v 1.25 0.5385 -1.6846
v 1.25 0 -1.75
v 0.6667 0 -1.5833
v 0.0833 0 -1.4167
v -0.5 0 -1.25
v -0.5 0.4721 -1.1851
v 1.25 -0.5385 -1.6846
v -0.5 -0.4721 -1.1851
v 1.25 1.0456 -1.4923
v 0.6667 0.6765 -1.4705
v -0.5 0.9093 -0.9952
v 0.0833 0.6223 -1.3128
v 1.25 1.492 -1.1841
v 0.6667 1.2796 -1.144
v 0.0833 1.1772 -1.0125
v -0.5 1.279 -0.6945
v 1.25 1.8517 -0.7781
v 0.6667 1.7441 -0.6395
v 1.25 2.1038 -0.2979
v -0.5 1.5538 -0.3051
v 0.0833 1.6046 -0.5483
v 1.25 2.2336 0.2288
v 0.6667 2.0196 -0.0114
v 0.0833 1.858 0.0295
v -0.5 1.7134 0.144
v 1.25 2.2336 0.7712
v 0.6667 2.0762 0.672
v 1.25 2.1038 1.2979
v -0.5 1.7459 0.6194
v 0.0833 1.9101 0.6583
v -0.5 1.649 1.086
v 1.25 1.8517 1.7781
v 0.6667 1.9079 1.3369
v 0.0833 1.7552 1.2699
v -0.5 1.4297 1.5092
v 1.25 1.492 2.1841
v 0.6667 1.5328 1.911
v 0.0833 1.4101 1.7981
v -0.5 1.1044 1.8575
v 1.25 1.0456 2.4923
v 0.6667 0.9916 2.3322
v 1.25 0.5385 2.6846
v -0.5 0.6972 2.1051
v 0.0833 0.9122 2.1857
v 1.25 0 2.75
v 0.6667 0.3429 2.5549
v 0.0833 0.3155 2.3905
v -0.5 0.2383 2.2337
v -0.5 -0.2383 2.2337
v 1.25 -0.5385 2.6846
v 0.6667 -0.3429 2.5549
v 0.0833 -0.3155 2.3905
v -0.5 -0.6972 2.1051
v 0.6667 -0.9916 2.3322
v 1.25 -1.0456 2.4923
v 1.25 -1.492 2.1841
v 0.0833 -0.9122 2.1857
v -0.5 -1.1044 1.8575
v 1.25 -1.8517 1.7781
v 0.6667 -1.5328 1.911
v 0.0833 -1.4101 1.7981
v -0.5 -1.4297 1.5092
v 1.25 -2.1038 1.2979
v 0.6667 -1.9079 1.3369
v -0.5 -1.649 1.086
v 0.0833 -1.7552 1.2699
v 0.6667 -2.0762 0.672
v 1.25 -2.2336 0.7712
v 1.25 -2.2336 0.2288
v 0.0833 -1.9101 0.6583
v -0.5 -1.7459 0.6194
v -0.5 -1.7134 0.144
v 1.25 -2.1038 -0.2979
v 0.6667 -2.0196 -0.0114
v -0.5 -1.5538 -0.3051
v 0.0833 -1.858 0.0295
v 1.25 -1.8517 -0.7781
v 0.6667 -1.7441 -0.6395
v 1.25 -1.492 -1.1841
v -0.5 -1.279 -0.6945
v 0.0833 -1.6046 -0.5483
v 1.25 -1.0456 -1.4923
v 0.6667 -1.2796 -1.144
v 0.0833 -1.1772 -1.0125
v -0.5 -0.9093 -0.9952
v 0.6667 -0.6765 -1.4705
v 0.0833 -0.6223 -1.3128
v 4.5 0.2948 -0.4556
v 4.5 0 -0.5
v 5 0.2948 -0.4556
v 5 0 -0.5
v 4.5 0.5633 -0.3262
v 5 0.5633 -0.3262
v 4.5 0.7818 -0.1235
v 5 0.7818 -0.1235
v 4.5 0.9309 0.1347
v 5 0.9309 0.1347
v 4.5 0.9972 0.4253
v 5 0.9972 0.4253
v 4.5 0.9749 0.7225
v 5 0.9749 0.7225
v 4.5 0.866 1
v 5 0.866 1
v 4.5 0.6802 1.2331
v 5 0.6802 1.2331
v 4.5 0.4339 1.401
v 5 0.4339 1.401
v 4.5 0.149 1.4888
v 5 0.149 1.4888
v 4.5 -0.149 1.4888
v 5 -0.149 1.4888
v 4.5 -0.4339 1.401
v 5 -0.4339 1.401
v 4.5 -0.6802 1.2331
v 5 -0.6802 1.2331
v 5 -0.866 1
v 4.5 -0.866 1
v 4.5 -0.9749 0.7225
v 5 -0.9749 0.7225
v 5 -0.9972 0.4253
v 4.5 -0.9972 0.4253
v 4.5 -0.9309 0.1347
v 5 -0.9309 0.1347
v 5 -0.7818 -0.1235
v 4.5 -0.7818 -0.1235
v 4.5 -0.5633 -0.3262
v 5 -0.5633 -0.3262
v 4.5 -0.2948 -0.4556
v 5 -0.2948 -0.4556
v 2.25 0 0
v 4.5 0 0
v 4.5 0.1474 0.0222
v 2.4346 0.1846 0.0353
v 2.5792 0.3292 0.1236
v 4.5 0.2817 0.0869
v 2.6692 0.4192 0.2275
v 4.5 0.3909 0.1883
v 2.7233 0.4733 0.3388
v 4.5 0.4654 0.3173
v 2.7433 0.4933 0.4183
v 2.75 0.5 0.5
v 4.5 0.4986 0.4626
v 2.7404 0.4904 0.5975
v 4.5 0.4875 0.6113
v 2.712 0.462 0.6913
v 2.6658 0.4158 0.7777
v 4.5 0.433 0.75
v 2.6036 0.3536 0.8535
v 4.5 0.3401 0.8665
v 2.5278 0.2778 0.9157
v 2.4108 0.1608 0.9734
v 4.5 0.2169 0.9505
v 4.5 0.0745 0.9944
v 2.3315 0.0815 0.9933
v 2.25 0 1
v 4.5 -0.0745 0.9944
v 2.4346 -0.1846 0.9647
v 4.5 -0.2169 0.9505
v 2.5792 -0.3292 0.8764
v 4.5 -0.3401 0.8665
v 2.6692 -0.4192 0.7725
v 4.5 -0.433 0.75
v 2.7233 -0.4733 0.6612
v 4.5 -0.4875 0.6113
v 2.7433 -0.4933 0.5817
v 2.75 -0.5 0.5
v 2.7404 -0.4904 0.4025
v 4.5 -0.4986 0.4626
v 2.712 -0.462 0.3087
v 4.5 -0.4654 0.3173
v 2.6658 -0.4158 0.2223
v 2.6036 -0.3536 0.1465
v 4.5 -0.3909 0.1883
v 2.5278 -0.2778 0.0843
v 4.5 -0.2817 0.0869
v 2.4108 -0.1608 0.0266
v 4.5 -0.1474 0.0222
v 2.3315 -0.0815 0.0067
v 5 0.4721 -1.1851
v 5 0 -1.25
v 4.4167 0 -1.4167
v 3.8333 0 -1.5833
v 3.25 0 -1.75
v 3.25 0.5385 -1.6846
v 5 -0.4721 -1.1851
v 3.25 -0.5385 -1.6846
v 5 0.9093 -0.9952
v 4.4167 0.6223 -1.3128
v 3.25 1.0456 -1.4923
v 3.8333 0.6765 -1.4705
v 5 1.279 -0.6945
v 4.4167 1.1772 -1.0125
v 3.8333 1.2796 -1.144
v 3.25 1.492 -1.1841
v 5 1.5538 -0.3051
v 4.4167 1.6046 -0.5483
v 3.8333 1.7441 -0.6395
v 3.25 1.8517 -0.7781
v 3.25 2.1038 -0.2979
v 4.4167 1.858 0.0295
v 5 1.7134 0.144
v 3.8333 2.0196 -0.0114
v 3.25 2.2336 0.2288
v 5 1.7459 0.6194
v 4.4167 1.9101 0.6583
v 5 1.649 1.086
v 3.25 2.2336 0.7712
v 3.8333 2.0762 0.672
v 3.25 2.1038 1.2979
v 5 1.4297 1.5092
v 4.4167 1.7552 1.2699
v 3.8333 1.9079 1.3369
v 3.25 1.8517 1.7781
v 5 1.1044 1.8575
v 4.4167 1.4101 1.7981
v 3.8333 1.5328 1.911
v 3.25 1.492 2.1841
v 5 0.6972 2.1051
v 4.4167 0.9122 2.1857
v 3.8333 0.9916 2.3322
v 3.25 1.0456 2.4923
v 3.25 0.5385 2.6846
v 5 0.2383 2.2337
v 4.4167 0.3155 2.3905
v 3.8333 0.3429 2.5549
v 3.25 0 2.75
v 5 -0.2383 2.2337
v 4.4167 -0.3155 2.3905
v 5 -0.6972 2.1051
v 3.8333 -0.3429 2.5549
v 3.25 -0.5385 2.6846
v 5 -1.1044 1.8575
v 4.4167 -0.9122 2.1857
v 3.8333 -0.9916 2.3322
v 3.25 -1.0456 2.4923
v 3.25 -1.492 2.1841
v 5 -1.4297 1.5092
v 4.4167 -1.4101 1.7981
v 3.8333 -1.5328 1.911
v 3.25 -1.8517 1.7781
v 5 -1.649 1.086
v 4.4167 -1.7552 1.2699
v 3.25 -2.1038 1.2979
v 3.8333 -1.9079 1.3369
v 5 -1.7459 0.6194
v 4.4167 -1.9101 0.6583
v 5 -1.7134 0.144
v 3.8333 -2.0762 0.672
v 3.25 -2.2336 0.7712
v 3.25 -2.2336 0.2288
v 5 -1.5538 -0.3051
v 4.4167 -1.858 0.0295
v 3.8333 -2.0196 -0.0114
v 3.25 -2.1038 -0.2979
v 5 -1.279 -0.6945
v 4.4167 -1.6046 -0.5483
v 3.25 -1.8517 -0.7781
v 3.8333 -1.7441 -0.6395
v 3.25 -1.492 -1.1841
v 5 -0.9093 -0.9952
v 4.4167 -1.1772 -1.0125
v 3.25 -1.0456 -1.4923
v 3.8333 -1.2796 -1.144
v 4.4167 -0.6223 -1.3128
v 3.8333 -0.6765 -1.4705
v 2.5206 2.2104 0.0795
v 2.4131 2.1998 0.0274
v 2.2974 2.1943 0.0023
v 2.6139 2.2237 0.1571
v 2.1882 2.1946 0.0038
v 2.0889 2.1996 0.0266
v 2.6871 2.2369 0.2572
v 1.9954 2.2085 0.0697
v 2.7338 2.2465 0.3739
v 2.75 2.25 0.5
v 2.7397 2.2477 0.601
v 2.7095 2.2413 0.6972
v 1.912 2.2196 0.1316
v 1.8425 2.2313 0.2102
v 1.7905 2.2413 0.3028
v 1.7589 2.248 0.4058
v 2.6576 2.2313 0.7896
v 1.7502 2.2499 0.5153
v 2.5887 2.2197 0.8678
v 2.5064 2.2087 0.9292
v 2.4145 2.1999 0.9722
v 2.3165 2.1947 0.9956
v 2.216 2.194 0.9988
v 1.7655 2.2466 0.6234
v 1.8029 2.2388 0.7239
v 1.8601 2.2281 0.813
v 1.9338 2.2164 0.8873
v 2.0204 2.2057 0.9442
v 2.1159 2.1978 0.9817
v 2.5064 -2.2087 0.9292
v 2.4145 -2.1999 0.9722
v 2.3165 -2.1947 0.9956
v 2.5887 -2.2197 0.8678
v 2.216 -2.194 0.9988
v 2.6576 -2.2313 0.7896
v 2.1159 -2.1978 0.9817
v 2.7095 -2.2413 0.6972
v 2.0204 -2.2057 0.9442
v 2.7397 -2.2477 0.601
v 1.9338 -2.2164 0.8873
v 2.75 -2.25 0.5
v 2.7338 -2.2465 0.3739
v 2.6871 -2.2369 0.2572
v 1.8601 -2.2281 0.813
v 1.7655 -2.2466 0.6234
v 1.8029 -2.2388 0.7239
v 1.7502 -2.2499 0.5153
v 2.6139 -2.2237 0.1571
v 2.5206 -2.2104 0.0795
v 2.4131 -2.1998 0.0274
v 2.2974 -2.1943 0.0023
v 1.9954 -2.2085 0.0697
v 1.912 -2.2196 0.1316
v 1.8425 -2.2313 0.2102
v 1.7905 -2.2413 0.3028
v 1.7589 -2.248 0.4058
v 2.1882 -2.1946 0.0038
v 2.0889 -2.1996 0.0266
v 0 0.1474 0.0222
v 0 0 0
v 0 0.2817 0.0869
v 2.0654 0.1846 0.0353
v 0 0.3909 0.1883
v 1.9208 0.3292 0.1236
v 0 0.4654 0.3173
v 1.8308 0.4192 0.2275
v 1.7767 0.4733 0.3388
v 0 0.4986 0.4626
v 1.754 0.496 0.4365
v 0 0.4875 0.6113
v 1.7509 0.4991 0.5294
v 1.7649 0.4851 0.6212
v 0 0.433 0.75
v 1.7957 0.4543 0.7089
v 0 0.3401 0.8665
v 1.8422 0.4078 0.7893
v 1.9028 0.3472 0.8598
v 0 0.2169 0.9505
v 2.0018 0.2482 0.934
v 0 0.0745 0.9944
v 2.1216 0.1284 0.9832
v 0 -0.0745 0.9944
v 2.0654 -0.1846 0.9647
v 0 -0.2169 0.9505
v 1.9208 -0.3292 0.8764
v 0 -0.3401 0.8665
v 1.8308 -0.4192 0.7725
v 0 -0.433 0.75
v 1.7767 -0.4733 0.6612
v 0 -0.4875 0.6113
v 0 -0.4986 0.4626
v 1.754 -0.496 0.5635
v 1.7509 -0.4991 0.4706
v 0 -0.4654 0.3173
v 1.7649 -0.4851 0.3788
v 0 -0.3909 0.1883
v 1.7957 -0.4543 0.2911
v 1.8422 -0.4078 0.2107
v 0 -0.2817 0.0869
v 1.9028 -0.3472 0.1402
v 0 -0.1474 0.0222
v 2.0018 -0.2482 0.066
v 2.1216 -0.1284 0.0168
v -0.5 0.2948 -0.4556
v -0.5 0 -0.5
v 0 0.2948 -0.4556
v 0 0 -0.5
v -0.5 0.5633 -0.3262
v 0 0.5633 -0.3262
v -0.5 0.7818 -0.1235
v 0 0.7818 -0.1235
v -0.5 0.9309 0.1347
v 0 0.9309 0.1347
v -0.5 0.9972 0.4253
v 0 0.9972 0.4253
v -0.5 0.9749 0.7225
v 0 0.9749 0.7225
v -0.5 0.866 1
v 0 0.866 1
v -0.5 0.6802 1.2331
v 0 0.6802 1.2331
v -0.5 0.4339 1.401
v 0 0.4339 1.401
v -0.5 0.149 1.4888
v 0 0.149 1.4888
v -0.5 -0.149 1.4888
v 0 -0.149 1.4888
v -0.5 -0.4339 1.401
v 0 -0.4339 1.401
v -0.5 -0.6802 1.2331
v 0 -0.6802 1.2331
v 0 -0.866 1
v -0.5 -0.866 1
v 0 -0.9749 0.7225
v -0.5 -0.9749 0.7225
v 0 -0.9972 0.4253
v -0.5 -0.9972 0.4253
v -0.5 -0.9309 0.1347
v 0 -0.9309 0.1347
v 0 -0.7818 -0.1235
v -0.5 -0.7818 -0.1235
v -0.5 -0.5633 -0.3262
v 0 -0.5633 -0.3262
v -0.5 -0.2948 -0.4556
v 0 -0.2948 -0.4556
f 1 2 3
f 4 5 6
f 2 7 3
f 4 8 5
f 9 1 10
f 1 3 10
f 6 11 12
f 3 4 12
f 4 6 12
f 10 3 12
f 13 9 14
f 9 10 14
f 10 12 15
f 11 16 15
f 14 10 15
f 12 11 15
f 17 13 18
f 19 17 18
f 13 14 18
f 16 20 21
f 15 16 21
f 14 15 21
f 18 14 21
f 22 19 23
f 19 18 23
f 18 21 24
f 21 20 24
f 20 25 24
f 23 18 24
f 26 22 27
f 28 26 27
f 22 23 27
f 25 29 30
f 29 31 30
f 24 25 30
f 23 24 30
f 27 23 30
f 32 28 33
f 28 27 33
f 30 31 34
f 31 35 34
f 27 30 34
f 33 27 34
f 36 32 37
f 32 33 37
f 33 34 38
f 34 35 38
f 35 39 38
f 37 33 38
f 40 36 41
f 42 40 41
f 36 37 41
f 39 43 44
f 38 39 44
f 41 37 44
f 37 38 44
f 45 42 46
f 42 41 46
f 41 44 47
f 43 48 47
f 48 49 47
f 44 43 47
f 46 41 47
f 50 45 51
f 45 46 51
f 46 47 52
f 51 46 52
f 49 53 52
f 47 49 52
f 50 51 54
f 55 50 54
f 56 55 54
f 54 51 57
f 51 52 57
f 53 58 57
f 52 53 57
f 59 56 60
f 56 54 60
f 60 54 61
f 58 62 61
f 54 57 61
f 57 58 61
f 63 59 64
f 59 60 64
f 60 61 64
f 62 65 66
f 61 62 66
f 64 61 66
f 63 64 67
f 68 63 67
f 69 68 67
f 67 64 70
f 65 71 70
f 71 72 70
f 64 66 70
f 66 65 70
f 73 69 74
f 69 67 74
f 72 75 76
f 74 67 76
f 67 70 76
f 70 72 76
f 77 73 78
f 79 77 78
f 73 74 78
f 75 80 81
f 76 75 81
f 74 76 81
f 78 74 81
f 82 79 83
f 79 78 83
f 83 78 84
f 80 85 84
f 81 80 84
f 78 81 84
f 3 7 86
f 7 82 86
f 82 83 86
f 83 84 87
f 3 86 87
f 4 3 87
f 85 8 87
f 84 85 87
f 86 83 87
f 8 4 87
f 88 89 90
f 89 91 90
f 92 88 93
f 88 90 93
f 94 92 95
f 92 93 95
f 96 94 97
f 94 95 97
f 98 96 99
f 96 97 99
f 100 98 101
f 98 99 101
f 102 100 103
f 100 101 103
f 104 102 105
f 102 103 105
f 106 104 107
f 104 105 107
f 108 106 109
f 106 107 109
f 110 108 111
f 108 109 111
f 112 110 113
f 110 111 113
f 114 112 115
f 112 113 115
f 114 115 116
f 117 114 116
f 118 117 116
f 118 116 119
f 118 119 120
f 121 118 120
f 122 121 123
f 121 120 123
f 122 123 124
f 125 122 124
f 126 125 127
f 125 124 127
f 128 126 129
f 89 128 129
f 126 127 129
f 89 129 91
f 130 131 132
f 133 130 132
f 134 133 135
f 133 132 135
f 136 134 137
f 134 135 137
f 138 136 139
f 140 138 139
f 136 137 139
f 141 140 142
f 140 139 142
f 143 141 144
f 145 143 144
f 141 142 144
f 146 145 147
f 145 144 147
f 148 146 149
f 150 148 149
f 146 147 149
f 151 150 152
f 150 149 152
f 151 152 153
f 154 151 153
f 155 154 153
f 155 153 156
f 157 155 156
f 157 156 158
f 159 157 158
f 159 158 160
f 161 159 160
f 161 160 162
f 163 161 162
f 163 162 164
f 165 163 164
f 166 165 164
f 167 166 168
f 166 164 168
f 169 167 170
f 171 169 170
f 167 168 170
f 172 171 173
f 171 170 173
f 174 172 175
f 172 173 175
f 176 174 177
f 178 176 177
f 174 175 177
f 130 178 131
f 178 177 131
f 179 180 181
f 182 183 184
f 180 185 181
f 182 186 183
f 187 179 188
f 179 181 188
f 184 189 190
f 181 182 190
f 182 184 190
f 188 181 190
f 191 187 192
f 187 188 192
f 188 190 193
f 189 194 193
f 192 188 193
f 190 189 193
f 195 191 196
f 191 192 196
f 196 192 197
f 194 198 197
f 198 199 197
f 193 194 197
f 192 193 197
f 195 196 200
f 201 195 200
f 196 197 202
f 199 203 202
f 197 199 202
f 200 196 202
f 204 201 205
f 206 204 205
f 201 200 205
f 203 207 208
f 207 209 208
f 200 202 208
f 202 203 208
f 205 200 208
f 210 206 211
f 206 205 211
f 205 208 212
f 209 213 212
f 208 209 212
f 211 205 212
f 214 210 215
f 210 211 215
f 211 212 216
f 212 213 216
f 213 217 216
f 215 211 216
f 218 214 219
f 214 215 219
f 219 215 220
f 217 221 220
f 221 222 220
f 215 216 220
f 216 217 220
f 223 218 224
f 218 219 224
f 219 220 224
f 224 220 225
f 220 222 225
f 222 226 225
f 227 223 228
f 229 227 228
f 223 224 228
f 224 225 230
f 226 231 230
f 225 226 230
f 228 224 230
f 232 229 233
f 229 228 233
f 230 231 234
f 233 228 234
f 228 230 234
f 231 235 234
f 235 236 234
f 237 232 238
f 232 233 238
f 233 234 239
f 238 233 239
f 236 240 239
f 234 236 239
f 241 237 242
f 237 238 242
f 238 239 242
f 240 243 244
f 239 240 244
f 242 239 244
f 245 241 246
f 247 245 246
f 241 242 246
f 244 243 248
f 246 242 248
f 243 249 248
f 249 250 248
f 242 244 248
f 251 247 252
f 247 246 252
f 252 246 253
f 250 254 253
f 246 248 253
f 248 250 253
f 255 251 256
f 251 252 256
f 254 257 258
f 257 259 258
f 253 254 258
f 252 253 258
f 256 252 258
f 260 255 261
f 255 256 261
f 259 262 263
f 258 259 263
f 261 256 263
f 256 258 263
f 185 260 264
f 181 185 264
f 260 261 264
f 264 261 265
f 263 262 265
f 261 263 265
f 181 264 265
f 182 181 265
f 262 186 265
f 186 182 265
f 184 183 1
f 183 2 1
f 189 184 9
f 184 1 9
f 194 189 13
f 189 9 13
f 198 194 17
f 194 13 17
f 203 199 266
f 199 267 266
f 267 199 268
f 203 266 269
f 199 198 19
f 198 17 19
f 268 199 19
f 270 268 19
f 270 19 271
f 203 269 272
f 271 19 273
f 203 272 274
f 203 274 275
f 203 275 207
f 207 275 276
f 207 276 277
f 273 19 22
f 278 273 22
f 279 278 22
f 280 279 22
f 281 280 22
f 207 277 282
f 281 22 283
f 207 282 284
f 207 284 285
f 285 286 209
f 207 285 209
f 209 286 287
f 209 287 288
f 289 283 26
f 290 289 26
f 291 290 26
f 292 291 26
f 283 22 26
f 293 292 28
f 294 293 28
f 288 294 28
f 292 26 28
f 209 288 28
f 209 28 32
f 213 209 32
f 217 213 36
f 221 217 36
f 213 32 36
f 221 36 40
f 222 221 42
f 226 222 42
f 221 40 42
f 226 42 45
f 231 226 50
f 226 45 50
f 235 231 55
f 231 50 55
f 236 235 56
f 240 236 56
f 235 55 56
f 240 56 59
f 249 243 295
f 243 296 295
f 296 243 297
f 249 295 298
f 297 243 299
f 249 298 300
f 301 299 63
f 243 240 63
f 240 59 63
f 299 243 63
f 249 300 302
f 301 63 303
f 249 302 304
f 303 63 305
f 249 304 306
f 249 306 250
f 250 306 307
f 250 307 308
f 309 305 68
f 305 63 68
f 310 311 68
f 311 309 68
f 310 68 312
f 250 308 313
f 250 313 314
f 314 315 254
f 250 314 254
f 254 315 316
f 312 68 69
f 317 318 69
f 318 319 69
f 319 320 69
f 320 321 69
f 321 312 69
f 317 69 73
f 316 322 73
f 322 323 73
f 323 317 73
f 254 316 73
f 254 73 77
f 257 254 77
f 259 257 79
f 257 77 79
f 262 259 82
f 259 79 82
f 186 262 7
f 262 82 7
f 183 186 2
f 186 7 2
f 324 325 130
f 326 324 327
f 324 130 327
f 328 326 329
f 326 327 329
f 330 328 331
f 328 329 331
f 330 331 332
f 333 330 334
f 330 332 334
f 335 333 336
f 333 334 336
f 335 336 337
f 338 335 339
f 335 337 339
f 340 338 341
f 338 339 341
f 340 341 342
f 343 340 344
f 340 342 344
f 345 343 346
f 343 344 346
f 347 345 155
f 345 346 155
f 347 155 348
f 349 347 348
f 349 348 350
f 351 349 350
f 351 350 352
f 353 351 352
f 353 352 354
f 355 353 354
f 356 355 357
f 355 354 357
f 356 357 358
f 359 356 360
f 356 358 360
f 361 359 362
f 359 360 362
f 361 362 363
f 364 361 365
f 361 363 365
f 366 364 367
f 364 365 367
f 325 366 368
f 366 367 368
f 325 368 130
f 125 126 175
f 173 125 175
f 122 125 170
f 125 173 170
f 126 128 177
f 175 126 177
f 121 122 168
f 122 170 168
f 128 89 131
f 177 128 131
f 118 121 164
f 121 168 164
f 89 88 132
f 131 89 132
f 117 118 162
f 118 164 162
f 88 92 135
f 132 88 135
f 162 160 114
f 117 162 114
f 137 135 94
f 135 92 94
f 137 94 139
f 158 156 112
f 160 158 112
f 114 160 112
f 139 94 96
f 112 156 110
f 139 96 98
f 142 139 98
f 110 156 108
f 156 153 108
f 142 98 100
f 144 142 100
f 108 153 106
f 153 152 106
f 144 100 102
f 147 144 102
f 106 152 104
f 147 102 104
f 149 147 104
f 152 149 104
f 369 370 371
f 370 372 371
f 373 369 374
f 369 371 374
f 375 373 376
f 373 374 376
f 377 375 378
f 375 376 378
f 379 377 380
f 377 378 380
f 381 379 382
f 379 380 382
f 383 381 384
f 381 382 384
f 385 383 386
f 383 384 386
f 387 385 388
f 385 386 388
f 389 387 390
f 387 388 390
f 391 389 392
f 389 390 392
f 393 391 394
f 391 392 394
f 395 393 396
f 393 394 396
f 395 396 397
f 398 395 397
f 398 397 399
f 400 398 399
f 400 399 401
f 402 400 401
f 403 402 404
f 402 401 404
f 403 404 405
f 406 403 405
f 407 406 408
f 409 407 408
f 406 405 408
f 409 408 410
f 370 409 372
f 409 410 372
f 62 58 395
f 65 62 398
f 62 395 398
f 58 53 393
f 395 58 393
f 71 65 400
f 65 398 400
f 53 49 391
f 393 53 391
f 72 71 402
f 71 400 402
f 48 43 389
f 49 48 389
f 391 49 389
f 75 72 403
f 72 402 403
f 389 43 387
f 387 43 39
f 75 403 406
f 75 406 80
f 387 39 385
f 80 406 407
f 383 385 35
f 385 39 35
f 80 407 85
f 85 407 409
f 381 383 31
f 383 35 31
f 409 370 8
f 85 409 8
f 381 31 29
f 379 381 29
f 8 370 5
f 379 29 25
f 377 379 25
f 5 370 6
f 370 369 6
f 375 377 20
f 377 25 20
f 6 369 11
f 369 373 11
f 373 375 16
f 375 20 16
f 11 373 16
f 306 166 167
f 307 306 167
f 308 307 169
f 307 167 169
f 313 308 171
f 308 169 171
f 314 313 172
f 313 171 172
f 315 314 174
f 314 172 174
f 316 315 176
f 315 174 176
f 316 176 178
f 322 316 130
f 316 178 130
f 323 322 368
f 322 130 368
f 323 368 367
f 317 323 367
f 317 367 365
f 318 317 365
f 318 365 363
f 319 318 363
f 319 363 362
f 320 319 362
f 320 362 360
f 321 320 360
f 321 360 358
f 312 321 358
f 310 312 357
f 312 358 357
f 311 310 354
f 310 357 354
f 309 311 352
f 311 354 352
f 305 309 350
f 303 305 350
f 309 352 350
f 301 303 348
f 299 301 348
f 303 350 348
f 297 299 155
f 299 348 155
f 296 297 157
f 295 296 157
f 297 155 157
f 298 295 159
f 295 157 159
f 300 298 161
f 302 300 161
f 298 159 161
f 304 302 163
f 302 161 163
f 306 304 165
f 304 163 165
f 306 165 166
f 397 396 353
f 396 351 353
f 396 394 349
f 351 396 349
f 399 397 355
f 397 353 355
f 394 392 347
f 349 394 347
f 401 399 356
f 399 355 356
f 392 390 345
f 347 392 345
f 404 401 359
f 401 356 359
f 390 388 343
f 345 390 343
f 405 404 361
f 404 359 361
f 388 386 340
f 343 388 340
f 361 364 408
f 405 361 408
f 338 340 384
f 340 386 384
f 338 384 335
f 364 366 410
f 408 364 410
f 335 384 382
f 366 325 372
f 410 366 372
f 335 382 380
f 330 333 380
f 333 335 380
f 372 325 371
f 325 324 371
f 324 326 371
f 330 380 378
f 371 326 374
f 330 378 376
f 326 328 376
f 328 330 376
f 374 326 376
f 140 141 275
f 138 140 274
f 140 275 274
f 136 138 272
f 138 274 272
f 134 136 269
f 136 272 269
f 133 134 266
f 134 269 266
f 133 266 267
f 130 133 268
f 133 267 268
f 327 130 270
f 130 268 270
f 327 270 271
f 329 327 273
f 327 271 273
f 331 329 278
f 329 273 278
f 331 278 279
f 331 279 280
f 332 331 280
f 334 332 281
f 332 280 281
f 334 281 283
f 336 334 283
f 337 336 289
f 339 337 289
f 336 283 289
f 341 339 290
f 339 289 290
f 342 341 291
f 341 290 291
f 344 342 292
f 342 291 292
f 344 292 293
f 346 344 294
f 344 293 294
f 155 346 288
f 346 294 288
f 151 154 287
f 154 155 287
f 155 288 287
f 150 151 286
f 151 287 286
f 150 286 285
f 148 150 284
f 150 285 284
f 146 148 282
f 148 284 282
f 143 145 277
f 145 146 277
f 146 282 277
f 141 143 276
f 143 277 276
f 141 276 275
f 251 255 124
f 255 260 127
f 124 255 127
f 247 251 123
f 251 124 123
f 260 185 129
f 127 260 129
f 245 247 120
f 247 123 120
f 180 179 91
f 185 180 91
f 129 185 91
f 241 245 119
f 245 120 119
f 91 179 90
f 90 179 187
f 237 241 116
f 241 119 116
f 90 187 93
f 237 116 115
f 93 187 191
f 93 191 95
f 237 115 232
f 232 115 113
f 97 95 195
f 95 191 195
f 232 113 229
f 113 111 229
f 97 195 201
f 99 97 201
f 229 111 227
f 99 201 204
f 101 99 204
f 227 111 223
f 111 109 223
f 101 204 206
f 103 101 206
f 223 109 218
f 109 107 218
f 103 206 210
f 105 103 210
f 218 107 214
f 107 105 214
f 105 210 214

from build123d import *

# Parameters (mm, degrees)
SKETCH3_R               = 0.5
CUT_EXTRUDE2_DEPTH      = 1.25
CUT_EXTRUDE2_DEPTH_BACK = 5.25


with BuildPart() as part:
    # Sketch1 → Revolve1 (revolve)
    with BuildSketch(Plane(origin=(0, 0, 0), x_dir=(1, 0, 0), z_dir=(0, 1, 0))):
        Polygon((0, 0), (4.5, 0), (4.5, 0.5), (5, 0.5), (5, 1.25), (3.25, 1.75), (1.25, 1.75), (-0.5, 1.25), (-0.5, 0.5), (0, 0.5), align=None)
    revolve(axis=Axis((0, 0, 0.5), (1, 0, 0)))

    # Sketch3 → Cut-Extrude2 (cut, two sides)
    with BuildSketch(Plane(origin=(0, 2, 0), x_dir=(1, 0, 0), z_dir=(0, 1, 0))) as cut_extrude2_sk:
        with Locations((2.25, -0.5)):
            Circle(SKETCH3_R)
    extrude(amount=CUT_EXTRUDE2_DEPTH, mode=Mode.SUBTRACT)
    extrude(cut_extrude2_sk.sketch, amount=-CUT_EXTRUDE2_DEPTH_BACK, mode=Mode.SUBTRACT)


solid = part.part
